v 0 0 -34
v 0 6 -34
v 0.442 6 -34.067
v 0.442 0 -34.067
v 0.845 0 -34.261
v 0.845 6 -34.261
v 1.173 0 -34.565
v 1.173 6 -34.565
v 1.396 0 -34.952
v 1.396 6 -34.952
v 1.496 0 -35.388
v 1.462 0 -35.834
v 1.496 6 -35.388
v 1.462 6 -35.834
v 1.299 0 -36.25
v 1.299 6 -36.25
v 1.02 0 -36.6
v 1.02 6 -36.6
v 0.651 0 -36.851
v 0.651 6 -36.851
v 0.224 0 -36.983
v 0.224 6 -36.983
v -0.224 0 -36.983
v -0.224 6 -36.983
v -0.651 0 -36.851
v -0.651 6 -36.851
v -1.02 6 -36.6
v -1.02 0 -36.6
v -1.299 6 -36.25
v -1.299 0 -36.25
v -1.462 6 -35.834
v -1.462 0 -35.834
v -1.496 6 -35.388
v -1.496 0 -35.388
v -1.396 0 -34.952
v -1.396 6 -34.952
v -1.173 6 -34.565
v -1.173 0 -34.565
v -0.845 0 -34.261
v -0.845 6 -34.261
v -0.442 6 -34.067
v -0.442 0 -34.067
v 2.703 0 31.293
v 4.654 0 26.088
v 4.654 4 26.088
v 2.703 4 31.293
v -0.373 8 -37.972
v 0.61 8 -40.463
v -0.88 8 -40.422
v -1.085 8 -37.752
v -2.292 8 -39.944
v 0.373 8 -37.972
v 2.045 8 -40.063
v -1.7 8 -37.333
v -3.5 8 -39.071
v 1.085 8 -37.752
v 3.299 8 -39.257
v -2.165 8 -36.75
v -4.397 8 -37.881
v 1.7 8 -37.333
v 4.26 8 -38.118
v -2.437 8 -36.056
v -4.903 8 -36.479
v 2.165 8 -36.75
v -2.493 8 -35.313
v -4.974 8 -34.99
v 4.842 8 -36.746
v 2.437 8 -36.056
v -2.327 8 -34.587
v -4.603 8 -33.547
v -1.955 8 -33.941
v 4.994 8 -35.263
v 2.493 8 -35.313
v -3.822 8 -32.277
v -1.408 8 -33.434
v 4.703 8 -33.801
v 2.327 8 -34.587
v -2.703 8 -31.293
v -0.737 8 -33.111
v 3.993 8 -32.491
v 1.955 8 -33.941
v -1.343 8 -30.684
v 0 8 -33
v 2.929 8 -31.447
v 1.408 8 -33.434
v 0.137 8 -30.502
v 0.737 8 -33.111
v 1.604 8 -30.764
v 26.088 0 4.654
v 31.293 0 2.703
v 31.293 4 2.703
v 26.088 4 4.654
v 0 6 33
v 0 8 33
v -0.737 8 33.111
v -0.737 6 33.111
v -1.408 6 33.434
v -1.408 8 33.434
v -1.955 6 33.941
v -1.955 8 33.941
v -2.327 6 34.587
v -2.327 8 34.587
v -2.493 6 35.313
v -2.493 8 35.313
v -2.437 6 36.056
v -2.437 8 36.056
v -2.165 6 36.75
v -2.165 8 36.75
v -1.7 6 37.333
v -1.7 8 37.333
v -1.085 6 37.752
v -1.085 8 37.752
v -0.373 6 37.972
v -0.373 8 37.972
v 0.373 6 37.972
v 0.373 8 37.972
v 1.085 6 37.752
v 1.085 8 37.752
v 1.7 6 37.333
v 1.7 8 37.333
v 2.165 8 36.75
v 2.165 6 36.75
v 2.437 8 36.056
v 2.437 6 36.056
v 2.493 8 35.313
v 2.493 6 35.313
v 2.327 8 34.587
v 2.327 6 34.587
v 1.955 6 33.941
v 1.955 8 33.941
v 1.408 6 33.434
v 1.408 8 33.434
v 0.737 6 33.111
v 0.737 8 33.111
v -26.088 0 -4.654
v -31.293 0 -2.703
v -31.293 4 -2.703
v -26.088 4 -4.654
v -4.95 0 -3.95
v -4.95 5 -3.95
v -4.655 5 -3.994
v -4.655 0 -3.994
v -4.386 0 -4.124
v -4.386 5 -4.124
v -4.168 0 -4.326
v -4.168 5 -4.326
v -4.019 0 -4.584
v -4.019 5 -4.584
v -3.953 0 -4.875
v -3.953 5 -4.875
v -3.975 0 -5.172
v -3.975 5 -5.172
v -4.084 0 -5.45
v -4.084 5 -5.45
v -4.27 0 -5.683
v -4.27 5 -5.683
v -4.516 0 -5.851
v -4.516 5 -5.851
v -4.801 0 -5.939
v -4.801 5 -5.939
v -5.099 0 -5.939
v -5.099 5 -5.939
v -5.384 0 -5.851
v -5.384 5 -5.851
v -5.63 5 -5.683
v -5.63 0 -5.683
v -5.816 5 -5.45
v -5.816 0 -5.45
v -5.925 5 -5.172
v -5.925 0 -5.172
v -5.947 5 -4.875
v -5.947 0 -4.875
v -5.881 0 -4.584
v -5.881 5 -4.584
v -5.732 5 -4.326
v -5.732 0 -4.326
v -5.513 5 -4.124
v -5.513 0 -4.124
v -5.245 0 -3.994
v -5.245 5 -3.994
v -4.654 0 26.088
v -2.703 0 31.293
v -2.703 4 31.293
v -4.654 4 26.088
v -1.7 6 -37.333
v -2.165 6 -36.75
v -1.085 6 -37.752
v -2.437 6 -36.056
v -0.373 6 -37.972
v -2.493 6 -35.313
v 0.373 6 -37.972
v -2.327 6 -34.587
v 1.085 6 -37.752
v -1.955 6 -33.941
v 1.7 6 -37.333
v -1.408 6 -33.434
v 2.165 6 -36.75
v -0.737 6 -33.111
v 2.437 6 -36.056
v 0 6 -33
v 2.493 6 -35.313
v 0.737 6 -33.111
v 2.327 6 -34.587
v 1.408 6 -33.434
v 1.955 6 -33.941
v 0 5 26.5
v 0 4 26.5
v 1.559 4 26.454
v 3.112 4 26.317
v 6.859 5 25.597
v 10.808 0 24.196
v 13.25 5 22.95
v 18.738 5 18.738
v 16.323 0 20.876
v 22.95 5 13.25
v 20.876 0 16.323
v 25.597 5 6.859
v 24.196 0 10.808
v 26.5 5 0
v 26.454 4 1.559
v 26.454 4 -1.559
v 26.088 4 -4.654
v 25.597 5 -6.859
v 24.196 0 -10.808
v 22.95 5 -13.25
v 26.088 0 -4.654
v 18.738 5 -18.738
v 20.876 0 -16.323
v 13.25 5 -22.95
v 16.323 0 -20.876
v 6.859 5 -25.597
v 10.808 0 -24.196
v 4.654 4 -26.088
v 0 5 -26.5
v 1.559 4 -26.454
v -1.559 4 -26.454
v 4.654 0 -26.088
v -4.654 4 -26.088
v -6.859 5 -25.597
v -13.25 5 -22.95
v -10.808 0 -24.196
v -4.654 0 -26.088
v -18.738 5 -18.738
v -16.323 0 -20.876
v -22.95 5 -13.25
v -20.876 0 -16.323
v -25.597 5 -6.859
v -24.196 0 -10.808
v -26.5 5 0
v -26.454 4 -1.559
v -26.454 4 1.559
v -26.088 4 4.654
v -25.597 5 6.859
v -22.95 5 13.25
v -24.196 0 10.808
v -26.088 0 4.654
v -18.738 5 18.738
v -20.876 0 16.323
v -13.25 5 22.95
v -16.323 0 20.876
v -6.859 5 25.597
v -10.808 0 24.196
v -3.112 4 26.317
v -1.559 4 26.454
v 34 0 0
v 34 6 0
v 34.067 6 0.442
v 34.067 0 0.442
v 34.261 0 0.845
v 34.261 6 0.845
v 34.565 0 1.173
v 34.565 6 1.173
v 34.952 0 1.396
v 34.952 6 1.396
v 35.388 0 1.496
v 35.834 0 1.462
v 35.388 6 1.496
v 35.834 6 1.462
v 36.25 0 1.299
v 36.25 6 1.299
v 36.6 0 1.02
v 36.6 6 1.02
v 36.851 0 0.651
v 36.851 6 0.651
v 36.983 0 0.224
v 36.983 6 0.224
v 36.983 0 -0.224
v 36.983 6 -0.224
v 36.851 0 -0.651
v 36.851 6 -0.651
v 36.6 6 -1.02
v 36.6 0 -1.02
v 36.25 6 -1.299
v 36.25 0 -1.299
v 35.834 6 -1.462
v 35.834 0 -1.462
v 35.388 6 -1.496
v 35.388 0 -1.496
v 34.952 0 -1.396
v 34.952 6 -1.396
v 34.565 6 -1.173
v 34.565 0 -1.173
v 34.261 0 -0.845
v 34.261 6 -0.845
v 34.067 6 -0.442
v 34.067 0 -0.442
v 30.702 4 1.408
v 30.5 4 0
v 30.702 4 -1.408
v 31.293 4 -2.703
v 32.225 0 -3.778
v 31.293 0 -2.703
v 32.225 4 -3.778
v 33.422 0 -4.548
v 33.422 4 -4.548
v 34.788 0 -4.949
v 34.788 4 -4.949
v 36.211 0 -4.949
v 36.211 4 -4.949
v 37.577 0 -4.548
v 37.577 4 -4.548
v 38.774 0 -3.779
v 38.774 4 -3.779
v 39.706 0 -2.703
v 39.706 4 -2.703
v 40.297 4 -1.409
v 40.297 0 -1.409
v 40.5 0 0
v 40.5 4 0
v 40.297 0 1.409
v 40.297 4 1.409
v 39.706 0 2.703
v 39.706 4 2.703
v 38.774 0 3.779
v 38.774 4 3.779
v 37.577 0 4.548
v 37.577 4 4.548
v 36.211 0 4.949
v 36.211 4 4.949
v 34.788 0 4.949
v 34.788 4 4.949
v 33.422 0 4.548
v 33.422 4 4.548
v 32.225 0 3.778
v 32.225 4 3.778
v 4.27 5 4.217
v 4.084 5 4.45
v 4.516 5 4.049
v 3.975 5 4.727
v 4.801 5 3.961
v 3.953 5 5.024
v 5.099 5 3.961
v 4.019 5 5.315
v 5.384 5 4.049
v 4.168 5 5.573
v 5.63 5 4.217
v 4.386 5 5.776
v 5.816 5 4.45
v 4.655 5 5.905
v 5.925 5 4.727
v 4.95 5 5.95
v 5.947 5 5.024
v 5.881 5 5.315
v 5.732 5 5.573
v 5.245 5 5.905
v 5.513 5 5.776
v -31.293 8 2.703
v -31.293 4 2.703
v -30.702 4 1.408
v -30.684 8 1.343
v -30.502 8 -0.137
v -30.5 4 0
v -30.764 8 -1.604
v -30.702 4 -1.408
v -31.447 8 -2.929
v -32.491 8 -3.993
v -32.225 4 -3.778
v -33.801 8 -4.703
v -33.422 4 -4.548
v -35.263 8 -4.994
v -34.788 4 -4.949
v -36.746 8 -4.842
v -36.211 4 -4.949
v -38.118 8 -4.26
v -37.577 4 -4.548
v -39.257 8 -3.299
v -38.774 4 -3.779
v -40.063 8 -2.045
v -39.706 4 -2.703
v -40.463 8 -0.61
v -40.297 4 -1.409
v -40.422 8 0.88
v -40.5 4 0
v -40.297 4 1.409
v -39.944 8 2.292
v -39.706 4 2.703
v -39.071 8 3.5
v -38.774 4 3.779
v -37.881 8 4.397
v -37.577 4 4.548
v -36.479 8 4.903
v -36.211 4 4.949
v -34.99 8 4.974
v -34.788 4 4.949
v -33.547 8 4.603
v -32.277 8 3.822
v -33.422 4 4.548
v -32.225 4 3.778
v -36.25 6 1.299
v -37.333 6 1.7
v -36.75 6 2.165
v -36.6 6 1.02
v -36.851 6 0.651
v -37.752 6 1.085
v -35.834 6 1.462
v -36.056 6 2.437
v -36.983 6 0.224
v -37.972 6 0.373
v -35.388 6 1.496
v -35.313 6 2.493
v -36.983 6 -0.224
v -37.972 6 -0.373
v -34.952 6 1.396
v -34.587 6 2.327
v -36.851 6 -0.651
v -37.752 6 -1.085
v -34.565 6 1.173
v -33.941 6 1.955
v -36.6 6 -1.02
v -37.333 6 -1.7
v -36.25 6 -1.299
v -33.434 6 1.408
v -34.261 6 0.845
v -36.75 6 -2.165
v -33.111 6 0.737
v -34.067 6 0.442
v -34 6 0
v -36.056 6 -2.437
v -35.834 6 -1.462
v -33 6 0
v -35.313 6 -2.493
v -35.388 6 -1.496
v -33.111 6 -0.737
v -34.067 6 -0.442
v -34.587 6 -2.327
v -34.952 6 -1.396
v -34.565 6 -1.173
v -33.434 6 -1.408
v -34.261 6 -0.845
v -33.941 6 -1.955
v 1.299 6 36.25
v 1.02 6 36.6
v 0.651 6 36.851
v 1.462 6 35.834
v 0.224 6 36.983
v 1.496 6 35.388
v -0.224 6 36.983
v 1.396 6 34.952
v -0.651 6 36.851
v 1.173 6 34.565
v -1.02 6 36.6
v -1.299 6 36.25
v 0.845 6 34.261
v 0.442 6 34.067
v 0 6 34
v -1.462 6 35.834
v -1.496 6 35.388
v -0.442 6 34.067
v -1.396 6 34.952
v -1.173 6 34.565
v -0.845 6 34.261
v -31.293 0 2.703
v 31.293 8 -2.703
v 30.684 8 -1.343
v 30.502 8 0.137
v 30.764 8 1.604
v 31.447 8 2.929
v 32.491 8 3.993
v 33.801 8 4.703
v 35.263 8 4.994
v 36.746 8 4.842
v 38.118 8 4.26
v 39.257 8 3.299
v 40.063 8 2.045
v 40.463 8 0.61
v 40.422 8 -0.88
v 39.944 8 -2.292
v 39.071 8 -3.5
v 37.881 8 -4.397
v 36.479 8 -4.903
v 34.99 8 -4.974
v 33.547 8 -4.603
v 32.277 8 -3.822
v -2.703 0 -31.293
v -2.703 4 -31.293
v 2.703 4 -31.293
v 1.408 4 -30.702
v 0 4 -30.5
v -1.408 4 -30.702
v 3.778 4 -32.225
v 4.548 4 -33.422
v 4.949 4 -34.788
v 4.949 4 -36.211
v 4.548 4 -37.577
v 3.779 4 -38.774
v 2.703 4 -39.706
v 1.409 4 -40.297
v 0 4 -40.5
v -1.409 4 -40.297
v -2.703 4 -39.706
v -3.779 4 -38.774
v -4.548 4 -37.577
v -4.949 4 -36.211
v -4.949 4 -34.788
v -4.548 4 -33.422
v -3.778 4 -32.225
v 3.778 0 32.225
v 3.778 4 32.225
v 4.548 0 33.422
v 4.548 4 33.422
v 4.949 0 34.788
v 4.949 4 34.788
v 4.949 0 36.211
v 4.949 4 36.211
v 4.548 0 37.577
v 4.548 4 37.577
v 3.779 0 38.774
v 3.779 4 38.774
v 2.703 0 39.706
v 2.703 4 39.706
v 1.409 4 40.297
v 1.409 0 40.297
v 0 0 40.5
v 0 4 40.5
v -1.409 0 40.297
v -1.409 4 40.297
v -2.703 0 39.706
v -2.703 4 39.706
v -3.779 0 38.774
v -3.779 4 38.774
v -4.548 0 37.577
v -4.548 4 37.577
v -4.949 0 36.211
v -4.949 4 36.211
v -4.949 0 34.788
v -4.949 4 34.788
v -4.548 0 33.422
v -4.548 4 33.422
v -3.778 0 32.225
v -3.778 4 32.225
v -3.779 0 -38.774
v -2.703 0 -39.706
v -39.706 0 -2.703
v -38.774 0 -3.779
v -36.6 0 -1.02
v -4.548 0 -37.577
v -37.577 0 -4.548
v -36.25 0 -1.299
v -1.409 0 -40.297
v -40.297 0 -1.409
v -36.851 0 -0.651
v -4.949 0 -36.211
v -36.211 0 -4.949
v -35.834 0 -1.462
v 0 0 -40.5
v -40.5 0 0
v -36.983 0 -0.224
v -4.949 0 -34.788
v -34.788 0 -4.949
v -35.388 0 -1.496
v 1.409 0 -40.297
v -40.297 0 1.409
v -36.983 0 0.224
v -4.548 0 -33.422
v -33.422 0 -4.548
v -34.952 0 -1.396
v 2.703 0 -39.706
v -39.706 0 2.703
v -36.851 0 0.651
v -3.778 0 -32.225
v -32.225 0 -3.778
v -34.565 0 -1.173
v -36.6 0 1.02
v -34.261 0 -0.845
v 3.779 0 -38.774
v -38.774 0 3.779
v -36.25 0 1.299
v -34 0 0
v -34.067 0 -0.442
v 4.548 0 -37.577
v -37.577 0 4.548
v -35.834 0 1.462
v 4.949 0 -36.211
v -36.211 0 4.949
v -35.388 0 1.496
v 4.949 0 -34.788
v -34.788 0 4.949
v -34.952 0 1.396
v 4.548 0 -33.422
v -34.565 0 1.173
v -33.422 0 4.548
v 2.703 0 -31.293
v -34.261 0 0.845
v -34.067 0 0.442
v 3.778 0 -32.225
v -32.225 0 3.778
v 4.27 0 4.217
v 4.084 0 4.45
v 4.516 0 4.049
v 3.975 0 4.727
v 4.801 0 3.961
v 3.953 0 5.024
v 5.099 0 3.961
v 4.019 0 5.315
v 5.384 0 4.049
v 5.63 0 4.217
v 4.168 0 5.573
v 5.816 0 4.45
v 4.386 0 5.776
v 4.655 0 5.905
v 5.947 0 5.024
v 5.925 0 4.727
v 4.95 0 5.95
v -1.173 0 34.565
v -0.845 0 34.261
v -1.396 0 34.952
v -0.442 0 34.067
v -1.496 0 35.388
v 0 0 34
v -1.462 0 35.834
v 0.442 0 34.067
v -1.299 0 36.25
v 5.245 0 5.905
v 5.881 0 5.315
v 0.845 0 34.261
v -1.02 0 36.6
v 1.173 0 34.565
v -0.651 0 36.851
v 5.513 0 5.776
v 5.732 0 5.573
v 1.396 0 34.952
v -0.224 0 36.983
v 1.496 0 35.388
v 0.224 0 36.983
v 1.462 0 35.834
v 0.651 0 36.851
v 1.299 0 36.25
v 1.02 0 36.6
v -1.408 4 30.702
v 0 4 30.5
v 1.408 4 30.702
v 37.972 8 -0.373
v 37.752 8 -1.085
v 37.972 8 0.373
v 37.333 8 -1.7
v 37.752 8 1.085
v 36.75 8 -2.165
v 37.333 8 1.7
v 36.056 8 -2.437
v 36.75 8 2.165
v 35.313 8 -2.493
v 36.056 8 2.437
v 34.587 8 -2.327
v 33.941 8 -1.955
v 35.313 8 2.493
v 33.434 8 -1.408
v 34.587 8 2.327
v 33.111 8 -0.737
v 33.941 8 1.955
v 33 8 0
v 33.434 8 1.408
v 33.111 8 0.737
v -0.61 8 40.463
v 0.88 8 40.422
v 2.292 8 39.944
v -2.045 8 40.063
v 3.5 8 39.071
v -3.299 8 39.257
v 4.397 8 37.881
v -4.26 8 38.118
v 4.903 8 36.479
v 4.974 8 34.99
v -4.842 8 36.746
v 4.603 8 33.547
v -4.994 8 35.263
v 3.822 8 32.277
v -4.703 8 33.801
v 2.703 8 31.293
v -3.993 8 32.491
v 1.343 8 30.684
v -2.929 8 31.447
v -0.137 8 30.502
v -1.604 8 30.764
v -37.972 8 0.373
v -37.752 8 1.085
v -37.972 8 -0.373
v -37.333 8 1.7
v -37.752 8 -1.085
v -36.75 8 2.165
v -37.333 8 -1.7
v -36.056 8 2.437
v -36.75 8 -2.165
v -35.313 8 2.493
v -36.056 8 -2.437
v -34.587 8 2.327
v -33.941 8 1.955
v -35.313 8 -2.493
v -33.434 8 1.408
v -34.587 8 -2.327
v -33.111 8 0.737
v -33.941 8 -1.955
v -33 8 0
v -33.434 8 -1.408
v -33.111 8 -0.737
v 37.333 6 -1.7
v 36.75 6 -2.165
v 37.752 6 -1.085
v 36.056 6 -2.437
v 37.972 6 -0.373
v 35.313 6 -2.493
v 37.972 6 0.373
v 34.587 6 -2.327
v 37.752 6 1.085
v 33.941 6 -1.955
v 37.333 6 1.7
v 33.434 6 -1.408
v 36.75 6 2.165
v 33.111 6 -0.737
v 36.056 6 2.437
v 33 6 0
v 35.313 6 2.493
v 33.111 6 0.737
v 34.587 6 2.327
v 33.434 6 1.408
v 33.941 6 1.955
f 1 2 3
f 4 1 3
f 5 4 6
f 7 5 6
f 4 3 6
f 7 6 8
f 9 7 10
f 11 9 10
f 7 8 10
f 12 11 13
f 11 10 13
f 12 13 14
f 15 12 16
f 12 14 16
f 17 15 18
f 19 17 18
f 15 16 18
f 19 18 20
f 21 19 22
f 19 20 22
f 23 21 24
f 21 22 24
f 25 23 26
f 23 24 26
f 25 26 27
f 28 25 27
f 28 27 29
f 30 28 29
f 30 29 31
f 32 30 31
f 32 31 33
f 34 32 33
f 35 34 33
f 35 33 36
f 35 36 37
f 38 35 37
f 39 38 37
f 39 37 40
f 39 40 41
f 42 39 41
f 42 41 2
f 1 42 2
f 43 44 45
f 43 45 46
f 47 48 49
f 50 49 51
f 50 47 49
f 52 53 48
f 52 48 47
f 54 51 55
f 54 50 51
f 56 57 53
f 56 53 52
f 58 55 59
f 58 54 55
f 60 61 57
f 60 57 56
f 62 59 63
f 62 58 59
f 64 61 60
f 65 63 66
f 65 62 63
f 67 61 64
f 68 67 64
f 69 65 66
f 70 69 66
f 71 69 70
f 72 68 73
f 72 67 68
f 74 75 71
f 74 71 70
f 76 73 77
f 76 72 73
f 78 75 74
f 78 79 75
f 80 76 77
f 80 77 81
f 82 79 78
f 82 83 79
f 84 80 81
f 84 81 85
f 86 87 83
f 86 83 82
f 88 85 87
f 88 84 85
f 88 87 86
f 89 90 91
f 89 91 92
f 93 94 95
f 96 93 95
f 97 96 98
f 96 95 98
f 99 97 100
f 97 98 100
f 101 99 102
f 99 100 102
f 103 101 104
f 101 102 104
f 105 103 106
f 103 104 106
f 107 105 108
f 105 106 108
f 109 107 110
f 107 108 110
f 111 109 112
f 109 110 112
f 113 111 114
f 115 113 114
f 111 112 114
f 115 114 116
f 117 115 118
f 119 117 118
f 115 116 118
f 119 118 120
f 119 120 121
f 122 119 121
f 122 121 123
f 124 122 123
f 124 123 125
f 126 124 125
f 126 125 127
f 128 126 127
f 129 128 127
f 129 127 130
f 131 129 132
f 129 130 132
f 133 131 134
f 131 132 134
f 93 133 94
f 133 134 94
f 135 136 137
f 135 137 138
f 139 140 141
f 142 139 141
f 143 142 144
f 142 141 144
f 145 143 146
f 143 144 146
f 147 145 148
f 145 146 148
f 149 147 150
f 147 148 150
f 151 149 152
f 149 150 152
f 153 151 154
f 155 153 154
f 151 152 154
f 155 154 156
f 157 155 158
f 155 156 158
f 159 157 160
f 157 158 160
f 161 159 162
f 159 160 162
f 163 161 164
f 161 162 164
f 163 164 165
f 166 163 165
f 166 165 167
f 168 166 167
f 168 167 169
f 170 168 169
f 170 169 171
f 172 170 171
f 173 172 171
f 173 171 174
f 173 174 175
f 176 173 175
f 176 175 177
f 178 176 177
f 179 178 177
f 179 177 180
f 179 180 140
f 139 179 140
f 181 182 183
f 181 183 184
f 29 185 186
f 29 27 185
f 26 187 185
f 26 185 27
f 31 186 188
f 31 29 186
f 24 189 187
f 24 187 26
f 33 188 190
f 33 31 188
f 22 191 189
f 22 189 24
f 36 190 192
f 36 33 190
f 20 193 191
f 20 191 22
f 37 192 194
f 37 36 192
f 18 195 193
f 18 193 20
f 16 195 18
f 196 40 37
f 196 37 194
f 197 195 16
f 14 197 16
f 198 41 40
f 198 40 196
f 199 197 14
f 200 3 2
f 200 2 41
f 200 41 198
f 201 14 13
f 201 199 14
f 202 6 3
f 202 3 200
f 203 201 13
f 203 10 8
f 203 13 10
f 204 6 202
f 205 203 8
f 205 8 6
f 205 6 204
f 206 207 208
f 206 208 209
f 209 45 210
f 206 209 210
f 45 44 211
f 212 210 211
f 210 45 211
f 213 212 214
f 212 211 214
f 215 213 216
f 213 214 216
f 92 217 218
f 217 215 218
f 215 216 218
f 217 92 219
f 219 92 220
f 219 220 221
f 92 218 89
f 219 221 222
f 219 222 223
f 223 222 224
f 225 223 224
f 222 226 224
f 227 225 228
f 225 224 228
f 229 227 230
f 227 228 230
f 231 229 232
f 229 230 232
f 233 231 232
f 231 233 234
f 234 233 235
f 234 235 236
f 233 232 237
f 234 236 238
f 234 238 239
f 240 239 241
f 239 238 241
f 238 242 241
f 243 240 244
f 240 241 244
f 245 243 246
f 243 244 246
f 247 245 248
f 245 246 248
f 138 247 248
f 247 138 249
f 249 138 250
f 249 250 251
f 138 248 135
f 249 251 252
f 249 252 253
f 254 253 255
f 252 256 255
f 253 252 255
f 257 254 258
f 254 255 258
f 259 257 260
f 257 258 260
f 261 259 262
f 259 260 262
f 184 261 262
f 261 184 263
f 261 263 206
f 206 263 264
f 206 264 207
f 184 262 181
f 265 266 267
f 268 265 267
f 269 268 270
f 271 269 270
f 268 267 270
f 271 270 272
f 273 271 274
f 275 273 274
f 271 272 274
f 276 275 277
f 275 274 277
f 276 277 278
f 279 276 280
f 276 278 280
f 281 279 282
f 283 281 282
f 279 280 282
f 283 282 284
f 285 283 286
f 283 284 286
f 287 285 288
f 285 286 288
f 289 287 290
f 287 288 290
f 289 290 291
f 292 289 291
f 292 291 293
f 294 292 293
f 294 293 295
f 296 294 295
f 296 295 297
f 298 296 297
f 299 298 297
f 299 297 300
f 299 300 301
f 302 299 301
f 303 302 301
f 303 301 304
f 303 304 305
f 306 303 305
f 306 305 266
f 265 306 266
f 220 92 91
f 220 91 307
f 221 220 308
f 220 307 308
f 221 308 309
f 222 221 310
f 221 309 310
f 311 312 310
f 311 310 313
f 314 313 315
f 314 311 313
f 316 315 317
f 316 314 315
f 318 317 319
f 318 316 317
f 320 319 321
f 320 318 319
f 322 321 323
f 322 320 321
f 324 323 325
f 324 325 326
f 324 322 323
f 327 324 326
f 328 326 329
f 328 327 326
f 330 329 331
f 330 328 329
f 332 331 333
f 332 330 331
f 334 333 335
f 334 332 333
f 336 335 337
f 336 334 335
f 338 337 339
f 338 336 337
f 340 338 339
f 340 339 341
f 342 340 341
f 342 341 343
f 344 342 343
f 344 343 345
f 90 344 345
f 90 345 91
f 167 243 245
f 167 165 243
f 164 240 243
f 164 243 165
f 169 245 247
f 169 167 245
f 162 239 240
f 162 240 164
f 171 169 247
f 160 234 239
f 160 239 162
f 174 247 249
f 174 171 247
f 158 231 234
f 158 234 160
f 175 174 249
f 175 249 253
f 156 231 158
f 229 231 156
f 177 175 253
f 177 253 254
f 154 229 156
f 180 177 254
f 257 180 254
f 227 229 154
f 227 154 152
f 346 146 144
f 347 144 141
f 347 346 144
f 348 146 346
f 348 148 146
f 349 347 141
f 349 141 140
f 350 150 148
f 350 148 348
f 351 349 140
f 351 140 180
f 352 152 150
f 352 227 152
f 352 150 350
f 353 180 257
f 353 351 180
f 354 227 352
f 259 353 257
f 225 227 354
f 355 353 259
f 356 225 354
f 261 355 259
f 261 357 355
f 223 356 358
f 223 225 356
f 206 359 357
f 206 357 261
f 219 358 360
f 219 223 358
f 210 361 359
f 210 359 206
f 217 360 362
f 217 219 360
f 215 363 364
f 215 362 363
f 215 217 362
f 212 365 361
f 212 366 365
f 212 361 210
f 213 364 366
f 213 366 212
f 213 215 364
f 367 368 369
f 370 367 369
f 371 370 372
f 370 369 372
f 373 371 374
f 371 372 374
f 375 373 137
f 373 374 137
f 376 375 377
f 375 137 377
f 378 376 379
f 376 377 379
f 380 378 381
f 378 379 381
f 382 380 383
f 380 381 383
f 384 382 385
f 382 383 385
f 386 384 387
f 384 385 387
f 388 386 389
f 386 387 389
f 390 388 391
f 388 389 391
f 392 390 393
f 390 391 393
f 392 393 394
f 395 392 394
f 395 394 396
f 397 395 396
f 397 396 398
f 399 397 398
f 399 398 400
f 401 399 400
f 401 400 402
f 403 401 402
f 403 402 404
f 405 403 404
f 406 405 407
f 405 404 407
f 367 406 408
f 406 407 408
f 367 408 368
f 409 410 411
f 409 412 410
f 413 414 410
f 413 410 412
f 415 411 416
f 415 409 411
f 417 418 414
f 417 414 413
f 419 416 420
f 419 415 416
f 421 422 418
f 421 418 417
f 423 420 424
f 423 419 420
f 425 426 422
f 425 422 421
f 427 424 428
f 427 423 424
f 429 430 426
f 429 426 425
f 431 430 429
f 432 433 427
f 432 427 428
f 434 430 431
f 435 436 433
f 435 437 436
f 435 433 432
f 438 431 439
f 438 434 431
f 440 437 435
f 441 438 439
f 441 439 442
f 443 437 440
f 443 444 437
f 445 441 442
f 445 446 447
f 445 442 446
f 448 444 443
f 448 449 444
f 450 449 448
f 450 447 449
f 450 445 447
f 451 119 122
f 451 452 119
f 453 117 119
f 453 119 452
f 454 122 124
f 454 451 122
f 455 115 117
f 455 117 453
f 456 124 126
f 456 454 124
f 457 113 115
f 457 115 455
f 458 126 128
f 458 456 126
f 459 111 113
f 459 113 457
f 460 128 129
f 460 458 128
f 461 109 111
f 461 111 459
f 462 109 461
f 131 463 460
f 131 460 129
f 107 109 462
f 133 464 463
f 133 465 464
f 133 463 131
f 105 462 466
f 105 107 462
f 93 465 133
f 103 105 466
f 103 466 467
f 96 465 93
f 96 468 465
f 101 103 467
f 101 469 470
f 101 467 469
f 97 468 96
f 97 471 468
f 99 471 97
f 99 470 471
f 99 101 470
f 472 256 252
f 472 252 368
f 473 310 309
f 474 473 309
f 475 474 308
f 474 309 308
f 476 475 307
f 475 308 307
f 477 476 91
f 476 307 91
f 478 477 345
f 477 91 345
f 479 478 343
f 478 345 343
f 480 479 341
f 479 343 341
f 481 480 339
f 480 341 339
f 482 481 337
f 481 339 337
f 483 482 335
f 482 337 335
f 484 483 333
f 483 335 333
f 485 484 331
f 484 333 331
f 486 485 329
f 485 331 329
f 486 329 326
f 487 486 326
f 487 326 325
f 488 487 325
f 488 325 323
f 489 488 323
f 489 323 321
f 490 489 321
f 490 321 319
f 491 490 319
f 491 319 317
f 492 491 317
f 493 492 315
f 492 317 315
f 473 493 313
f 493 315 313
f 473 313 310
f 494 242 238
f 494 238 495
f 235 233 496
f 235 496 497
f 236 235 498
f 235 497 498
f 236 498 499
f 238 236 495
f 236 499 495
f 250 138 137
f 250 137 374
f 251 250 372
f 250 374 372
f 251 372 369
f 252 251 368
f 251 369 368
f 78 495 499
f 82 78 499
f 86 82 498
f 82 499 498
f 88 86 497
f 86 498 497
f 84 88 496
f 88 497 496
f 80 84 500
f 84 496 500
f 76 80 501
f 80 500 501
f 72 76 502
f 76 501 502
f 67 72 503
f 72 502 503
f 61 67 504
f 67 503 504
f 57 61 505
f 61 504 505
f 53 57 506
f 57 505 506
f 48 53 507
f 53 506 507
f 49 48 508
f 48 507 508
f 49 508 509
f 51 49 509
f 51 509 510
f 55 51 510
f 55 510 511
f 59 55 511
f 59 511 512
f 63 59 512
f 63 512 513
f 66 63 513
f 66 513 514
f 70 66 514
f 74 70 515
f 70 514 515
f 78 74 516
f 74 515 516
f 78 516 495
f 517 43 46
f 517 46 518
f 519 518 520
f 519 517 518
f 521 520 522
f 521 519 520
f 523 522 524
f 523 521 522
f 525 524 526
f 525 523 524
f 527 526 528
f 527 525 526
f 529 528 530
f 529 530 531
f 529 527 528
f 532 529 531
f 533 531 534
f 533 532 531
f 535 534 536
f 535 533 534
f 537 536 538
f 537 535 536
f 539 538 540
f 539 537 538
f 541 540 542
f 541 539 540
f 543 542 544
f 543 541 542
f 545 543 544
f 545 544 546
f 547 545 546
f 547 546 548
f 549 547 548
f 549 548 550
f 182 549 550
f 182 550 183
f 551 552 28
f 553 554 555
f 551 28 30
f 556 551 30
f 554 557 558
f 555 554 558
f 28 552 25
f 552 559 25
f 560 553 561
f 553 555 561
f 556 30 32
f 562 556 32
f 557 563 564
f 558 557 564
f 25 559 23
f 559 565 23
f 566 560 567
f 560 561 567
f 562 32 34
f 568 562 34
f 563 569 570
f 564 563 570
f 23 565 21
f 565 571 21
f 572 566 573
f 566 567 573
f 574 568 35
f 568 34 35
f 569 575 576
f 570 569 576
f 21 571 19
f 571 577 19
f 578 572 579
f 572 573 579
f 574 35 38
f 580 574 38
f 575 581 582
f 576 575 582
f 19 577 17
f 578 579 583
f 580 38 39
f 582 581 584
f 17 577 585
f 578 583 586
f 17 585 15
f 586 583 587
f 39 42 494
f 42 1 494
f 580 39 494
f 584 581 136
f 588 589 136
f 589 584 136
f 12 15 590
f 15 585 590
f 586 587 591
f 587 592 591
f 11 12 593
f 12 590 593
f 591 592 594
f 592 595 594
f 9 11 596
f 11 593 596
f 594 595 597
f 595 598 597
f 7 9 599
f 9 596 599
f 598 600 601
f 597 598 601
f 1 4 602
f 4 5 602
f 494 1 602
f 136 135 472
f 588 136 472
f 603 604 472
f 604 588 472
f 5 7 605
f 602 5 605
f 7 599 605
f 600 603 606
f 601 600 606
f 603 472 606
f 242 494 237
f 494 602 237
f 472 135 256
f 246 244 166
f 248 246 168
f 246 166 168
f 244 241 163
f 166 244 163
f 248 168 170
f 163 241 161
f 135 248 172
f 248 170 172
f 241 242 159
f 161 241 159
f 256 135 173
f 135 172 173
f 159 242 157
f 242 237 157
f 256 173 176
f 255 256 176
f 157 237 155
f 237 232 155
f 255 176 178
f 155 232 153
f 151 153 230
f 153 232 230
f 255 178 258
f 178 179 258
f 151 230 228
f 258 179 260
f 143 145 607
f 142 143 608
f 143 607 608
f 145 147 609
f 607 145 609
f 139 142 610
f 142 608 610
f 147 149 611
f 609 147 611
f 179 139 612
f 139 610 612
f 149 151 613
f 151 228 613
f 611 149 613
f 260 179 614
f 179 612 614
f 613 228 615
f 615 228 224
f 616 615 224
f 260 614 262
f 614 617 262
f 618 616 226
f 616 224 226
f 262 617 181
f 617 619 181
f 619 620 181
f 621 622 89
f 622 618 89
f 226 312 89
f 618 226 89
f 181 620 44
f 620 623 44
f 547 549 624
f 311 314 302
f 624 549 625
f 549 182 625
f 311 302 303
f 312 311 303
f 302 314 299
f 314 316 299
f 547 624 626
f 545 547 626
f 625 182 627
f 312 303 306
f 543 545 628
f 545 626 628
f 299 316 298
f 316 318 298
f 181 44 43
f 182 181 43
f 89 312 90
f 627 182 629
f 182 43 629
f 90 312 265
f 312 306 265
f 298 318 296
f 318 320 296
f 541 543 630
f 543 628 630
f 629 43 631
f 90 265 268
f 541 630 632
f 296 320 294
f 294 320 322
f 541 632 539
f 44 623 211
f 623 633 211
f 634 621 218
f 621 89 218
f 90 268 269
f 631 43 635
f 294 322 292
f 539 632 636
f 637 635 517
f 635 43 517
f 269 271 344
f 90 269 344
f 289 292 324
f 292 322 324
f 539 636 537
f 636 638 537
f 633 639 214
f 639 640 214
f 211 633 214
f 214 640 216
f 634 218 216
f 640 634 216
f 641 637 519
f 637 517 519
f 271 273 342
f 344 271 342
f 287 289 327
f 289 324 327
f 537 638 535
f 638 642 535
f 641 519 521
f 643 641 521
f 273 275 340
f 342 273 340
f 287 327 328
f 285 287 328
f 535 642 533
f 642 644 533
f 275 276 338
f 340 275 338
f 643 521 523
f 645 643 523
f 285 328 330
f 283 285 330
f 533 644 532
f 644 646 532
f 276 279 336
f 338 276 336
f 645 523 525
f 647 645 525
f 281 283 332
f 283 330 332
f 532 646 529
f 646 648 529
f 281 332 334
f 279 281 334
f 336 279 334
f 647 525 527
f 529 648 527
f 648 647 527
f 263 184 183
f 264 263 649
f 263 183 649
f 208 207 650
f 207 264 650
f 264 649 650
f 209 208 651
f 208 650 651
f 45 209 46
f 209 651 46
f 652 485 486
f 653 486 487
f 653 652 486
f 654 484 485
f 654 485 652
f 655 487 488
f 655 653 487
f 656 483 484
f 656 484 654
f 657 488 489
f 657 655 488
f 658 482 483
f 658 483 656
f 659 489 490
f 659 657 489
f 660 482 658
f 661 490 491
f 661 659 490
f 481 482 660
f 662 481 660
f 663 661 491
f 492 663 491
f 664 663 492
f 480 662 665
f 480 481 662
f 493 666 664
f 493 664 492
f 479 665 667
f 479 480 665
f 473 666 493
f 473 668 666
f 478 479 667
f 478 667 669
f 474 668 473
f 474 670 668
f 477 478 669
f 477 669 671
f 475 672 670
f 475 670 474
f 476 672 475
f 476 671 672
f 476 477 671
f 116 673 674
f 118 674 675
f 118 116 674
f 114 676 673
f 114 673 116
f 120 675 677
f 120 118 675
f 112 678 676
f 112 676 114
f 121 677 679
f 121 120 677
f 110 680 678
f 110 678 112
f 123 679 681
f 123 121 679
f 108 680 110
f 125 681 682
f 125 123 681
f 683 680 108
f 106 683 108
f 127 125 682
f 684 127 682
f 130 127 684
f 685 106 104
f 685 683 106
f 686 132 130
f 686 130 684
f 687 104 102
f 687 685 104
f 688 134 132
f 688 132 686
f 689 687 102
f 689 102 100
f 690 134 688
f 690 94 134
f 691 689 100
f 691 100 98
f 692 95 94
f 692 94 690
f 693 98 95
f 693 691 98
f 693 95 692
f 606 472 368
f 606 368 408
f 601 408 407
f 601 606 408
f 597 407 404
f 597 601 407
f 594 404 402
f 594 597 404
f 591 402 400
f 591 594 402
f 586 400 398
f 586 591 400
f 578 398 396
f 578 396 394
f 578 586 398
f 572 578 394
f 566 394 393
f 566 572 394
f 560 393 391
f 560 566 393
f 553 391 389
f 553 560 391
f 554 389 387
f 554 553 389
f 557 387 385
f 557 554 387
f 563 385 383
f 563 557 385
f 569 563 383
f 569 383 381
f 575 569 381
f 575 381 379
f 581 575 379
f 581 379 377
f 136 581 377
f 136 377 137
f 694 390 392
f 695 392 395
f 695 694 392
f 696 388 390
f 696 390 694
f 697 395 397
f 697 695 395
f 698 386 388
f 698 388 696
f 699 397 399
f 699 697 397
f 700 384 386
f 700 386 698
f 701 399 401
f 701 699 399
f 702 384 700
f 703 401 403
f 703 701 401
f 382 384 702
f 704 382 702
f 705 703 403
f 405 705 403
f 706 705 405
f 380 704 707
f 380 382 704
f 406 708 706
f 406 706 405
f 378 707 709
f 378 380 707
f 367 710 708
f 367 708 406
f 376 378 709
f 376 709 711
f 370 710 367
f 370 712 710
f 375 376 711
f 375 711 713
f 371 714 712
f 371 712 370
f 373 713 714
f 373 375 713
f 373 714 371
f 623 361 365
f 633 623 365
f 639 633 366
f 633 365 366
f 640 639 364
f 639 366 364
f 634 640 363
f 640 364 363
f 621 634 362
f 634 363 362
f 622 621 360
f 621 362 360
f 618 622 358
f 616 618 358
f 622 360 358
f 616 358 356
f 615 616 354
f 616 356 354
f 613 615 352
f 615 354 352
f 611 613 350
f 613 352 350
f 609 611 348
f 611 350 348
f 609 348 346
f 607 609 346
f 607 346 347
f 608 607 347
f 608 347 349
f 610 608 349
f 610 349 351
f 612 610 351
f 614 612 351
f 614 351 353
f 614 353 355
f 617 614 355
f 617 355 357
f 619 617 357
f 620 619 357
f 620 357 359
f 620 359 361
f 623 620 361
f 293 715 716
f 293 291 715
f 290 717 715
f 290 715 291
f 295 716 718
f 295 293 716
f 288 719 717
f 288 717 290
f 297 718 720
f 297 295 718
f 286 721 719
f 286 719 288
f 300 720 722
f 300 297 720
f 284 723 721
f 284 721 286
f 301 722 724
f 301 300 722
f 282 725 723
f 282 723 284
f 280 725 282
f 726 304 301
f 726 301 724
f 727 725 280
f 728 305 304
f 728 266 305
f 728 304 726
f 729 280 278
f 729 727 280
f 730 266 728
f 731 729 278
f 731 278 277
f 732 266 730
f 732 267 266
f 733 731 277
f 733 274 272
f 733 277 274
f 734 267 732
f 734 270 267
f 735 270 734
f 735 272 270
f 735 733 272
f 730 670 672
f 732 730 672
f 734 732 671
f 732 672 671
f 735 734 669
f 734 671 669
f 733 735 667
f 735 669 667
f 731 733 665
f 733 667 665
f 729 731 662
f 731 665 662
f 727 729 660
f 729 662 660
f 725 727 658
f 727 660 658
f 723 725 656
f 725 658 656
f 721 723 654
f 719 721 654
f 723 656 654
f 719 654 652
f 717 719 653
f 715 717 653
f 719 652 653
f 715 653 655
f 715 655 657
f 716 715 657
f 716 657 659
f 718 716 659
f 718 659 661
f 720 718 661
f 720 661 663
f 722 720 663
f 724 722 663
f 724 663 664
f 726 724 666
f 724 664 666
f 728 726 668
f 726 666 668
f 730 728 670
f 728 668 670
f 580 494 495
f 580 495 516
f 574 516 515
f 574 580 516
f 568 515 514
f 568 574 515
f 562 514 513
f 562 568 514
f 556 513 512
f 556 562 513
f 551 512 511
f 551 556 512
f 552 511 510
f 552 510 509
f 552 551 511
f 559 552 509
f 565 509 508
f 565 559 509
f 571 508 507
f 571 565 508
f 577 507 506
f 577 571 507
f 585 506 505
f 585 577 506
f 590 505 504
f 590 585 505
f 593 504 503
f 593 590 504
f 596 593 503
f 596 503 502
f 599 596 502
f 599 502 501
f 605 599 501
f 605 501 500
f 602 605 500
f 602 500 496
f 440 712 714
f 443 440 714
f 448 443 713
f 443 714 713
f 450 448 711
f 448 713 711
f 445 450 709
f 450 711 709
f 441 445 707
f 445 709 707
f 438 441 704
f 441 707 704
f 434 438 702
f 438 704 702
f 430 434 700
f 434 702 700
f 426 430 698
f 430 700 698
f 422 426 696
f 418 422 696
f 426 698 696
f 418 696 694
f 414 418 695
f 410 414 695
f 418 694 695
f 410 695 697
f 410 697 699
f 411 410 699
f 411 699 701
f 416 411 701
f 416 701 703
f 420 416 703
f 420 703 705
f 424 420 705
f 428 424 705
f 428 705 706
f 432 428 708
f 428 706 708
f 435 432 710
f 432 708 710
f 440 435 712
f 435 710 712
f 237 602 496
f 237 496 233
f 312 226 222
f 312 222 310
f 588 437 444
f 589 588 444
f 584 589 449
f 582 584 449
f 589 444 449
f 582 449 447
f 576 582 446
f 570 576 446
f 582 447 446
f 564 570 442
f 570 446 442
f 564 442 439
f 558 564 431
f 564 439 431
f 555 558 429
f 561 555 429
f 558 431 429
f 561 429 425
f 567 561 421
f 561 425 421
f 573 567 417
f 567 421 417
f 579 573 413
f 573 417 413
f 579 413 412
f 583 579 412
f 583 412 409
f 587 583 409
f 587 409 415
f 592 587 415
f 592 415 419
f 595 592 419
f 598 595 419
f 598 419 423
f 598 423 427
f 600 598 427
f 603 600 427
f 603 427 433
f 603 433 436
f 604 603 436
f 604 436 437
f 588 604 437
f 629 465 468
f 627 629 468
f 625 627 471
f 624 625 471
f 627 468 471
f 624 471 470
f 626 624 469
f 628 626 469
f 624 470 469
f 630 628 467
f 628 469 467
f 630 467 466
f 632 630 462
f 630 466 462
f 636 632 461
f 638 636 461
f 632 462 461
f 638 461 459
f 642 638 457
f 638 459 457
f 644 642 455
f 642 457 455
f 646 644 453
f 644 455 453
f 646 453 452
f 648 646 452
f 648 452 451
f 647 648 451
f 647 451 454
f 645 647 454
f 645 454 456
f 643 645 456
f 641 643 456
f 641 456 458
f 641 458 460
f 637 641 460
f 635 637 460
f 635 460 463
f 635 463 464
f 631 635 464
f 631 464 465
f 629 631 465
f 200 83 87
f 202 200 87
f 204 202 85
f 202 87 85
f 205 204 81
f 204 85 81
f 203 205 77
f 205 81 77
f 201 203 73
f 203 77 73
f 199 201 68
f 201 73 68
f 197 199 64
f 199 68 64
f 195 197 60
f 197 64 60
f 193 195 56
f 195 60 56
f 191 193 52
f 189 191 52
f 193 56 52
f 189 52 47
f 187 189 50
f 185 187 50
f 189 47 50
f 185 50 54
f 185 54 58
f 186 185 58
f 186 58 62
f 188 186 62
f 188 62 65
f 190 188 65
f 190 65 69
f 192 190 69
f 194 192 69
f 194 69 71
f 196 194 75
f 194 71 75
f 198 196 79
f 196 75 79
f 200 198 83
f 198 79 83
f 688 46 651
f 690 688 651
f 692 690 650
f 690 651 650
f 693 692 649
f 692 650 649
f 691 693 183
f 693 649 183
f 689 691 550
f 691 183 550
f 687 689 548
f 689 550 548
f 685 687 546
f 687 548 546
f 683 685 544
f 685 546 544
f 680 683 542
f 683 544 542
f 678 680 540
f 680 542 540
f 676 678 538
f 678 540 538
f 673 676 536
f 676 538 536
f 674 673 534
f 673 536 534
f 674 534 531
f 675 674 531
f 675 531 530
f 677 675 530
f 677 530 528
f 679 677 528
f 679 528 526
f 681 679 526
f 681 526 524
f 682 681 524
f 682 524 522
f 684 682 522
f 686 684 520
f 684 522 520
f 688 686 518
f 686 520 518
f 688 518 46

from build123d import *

# Parameters (mm, degrees)
CROQUIS1_R              = 26.5
SALIENTE_EXTRUIR1_DEPTH = 5
SALIENTE_EXTRUIR2_DEPTH = 4
CROQUIS3_R              = 5
SALIENTE_EXTRUIR3_DEPTH = 4
CROQUIS4_R              = 2.5
CORTAR_EXTRUIR1_DEPTH   = 2
CROQUIS5_R              = 1.5
CORTAR_EXTRUIR2_DEPTH   = 49.769867746
MATRIZC1_COUNT          = 4
CROQUIS6_R              = 1
CORTAR_EXTRUIR3_DEPTH   = 58.493477891


with BuildPart() as part:
    # Croquis1 → Saliente-Extruir1 (new body)
    with BuildSketch(Plane(origin=(0, 0, 0), x_dir=(1, 0, 0), z_dir=(0, 1, 0))):
        with Locations(Location((0, 0, 0), (0, 0, 270))):
            Circle(CROQUIS1_R)
    extrude(amount=SALIENTE_EXTRUIR1_DEPTH)

    # Croquis2 → Saliente-Extruir2 (add)
    with BuildSketch(Plane(origin=(0, 0, 0), x_dir=(1, 0, 0), z_dir=(0, 1, 0))):
        with BuildLine():
            Line((-5.029139679, 25.088960855), (-2.702516138, 31.293290297))
            ThreePointArc((-2.702516138, 31.293290297), (0, 40.5), (2.702516138, 31.293290297))
            Line((2.702516138, 31.293290297), (5.029139679, 25.088960855))
            Line((5.029139679, 25.088960855), (-5.029139679, 25.088960855))
        make_face()
    saliente_extruir2 = extrude(amount=SALIENTE_EXTRUIR2_DEPTH)

    # Croquis3 → Saliente-Extruir3 (add)
    with BuildSketch(Plane(origin=(0, 4, 0), x_dir=(1, 0, 0), z_dir=(0, 1, 0))):
        with Locations(Location((0, 35.5, 0), (0, 0, 237.282097692))):
            Circle(CROQUIS3_R)
    saliente_extruir3 = extrude(amount=SALIENTE_EXTRUIR3_DEPTH)

    # Croquis4 → Cortar-Extruir1 (cut)
    with BuildSketch(Plane(origin=(0, 8, 0), x_dir=(1, 0, 0), z_dir=(0, 1, 0))):
        with Locations(Location((0, 35.5, 0), (0, 0, 270))):
            Circle(CROQUIS4_R)
    cortar_extruir1 = extrude(amount=-CORTAR_EXTRUIR1_DEPTH, mode=Mode.SUBTRACT)

    # Croquis5 → Cortar-Extruir2 (cut, through all)
    with BuildSketch(Plane(origin=(0, 6, 0), x_dir=(1, 0, 0), z_dir=(0, 1, 0))):
        with Locations(Location((0, 35.5, 0), (0, 0, 270))):
            Circle(CROQUIS5_R)
    cortar_extruir2 = extrude(amount=-CORTAR_EXTRUIR2_DEPTH, mode=Mode.SUBTRACT)

    # MatrizC1: Saliente-Extruir2, Saliente-Extruir3, Cortar-Extruir1, Cortar-Extruir2 ×4 about axis
    matrizc1_axis = Axis((0, 0, 0), (0, 1, 0))
    add([saliente_extruir2.rotate(matrizc1_axis, i * 360 / MATRIZC1_COUNT) for i in range(1, MATRIZC1_COUNT)])
    add([saliente_extruir3.rotate(matrizc1_axis, i * 360 / MATRIZC1_COUNT) for i in range(1, MATRIZC1_COUNT)])
    add([cortar_extruir1.rotate(matrizc1_axis, i * 360 / MATRIZC1_COUNT) for i in range(1, MATRIZC1_COUNT)], mode=Mode.SUBTRACT)
    add([cortar_extruir2.rotate(matrizc1_axis, i * 360 / MATRIZC1_COUNT) for i in range(1, MATRIZC1_COUNT)], mode=Mode.SUBTRACT)

    # Croquis6 → Cortar-Extruir3 (cut, through all)
    with BuildSketch(Plane(origin=(0, 5, 0), x_dir=(1, 0, 0), z_dir=(0, 1, 0))):
        with Locations(Location((-4.949747468, 4.949747468, 0), (0, 0, 270))):
            Circle(CROQUIS6_R)
        with Locations(Location((4.949747468, -4.949747468, 0), (0, 0, 270))):
            Circle(CROQUIS6_R)
    extrude(amount=-CORTAR_EXTRUIR3_DEPTH, mode=Mode.SUBTRACT)


solid = part.part
